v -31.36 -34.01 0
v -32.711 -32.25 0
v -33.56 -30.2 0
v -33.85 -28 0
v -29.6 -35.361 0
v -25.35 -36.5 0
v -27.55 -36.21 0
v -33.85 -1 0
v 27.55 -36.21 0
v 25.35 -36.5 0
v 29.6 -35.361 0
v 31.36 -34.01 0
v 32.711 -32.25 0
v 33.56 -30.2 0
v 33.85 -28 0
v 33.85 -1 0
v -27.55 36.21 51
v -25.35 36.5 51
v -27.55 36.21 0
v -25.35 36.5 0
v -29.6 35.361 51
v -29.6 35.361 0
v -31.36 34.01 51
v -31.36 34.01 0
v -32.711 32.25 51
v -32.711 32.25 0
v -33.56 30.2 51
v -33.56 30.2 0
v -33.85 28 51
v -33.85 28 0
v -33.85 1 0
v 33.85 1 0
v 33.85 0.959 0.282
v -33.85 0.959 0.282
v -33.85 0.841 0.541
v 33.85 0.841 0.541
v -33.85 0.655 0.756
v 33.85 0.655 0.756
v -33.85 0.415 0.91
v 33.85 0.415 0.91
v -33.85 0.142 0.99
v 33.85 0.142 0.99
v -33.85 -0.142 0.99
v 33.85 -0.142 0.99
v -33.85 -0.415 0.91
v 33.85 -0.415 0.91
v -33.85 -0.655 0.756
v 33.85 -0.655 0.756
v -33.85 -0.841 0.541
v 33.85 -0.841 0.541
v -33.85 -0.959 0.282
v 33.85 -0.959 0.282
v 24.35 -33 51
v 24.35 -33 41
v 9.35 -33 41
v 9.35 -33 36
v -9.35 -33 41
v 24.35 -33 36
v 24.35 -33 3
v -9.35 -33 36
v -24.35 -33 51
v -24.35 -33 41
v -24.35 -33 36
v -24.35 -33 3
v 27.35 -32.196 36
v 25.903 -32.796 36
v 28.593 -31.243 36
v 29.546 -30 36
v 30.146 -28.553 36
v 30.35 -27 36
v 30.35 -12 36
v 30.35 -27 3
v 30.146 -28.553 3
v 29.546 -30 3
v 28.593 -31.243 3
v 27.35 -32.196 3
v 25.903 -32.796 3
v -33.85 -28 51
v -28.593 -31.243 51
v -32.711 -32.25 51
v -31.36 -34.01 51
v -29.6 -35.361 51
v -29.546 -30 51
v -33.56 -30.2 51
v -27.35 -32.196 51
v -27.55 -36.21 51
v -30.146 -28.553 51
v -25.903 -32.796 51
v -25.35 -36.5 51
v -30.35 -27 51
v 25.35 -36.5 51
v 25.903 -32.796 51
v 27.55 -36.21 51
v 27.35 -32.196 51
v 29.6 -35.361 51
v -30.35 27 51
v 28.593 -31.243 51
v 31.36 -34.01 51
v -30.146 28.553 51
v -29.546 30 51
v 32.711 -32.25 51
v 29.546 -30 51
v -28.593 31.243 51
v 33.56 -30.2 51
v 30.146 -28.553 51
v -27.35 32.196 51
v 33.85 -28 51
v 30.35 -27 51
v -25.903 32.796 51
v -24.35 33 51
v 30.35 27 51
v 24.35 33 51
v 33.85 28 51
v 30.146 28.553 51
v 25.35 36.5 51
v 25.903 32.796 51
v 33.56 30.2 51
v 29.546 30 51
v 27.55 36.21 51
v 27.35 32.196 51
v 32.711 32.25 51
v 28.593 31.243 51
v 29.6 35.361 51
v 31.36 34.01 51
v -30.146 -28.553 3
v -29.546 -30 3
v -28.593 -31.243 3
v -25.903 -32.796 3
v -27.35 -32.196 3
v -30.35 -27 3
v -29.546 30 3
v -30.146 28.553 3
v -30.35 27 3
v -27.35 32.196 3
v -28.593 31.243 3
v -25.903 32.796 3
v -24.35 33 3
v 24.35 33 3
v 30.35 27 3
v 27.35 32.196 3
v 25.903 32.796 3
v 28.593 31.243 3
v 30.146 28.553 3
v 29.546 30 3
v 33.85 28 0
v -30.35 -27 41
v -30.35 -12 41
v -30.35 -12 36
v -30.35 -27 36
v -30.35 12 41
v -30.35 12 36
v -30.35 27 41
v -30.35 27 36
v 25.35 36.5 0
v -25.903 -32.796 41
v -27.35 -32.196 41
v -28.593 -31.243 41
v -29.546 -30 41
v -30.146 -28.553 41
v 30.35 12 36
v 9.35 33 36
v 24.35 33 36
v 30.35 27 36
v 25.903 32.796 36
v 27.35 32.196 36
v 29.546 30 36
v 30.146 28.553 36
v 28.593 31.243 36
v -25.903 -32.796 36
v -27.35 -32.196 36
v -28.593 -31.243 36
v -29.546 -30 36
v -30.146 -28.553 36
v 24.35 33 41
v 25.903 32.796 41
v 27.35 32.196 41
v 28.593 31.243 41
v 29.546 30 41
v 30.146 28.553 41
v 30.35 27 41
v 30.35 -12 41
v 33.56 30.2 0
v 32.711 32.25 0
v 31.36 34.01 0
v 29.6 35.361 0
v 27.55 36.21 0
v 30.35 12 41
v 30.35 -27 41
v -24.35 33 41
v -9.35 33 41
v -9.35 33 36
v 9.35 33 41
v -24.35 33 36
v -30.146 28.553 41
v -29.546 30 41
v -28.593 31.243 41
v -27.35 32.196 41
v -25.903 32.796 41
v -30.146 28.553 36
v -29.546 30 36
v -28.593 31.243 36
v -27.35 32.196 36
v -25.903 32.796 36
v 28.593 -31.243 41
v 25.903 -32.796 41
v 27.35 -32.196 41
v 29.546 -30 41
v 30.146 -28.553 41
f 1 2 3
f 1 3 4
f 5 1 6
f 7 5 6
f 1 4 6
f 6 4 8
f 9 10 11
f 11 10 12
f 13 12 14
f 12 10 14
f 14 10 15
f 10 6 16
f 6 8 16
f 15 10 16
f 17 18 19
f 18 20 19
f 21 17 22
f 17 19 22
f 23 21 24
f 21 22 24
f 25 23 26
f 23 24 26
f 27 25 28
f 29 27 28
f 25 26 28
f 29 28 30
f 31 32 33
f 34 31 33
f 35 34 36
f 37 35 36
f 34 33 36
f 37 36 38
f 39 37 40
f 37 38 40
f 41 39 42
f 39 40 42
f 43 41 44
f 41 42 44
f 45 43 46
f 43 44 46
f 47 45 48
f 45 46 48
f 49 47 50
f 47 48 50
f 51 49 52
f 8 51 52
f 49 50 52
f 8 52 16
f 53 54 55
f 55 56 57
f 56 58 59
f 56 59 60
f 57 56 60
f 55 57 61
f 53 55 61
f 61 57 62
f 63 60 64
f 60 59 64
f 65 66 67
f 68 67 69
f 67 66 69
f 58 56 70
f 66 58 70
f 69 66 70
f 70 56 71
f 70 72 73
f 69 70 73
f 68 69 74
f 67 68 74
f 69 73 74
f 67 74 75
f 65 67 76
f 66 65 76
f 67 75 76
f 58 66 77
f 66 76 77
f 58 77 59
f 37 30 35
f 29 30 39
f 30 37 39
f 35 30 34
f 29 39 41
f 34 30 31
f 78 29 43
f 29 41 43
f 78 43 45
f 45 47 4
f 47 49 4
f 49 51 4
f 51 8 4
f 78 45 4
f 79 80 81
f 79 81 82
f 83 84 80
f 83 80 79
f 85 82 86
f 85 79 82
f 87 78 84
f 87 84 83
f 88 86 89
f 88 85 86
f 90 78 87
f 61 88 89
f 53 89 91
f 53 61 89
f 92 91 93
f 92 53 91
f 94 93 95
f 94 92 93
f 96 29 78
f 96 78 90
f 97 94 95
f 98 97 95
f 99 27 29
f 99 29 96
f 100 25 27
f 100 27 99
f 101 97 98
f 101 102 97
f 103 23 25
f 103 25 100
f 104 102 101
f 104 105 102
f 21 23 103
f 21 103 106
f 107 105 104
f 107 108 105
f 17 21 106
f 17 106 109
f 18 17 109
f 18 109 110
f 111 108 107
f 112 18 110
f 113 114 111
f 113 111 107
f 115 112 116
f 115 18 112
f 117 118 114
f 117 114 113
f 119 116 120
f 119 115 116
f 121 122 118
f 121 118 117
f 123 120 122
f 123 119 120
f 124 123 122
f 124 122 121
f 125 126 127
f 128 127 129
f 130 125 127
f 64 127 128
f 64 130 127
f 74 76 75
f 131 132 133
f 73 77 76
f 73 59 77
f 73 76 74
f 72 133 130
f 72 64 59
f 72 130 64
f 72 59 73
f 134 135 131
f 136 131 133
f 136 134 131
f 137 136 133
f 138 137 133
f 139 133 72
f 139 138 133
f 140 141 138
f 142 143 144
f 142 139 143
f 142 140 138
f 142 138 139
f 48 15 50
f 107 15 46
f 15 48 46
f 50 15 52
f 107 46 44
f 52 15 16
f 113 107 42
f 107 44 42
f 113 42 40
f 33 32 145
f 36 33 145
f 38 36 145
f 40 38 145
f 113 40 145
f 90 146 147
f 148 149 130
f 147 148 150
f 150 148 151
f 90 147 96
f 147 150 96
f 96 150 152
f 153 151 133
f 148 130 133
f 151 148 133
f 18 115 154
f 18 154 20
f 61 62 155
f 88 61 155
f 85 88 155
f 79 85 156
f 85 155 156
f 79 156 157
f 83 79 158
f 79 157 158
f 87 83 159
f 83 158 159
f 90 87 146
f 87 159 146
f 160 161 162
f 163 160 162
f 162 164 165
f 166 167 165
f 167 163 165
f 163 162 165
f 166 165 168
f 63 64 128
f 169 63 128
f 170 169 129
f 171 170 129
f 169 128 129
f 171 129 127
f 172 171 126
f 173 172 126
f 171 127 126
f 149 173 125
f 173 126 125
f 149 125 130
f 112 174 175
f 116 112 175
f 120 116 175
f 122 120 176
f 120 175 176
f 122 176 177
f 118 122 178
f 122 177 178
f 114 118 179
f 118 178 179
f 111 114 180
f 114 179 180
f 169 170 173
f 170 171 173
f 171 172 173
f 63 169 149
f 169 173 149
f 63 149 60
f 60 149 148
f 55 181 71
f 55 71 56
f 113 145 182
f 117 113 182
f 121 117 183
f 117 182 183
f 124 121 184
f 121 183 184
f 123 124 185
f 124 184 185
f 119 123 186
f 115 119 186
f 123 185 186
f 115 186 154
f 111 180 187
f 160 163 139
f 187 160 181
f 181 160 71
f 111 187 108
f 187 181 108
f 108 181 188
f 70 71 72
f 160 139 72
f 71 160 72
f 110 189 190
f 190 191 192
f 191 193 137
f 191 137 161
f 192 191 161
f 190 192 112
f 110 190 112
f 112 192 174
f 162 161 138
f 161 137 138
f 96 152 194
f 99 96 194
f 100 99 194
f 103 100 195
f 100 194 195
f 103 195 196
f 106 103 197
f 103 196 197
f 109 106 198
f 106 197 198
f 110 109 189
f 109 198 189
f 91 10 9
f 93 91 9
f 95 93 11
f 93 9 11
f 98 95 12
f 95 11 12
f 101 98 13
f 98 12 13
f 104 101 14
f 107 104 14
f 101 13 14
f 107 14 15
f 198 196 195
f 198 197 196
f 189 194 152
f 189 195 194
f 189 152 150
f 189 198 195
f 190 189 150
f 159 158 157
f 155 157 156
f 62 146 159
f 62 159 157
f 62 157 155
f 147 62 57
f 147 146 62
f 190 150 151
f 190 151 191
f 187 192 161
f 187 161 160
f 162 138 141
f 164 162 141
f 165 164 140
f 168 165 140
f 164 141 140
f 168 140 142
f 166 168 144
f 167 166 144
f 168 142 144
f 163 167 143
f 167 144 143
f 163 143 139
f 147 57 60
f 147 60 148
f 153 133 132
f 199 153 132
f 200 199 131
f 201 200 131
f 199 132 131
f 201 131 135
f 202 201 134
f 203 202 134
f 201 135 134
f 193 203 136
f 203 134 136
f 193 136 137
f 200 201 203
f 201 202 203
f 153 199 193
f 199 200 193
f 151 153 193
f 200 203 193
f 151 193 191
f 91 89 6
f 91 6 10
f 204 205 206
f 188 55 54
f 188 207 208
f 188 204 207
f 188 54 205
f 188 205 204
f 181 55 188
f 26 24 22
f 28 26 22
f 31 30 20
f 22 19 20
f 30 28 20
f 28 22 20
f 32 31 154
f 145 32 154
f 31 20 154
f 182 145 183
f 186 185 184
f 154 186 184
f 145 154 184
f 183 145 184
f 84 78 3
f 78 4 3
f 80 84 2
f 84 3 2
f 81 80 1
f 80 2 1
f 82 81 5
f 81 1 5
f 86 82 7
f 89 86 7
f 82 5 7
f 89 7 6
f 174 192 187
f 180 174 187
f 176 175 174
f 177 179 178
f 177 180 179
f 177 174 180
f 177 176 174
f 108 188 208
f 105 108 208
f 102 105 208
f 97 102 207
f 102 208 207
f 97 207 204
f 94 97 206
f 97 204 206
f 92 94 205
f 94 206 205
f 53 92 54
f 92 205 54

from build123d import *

# Parameters (mm, degrees)
F1_DEPTH = 3
F3_DEPTH = 38
F5_DEPTH = 5
F7_DEPTH = 10
F9_DEPTH = 67.701


# Not quite as in the source:
# - a feature names something its author has since deleted; it is built from what else it names


with BuildPart() as f1:
    # F0 (on Top) → F1 (new body)
    with BuildSketch(Plane.XY):
        with BuildLine():
            Line((-25.35, -36.5), (25.35, -36.5))
            ThreePointArc((25.35, -36.5), (31.3604076401, -34.0104076401), (33.85, -28))
            Line((33.85, -28), (33.85, 28))
            ThreePointArc((33.85, 28), (31.3604076401, 34.0104076401), (25.35, 36.5))
            Line((25.35, 36.5), (-25.35, 36.5))
            ThreePointArc((-25.35, 36.5), (-31.3604076401, 34.0104076401), (-33.85, 28))
            Line((-33.85, 28), (-33.85, -28))
            ThreePointArc((-33.85, -28), (-31.3604076401, -34.0104076401), (-25.35, -36.5))
        make_face()
    extrude(amount=F1_DEPTH)

    # F2 (on face) → F3 (join)
    with BuildSketch(Plane.XY.offset(3)):
        with BuildLine():
            ThreePointArc((-25.35, 36.5), (-31.3604076401, 34.0104076401), (-33.85, 28))
            Line((-33.85, 28), (-33.85, -28))
            ThreePointArc((-33.85, -28), (-31.3604076401, -34.0104076401), (-25.35, -36.5))
            Line((-25.35, -36.5), (25.35, -36.5))
            ThreePointArc((25.35, -36.5), (31.3604076401, -34.0104076401), (33.85, -28))
            Line((33.85, -28), (33.85, 28))
            ThreePointArc((33.85, 28), (31.3604076401, 34.0104076401), (25.35, 36.5))
            Line((25.35, 36.5), (-25.35, 36.5))
        make_face()
        with BuildLine():
            ThreePointArc((30.35, -27), (28.5926406871, -31.2426406871), (24.35, -33))
            Line((24.35, -33), (-24.35, -33))
            ThreePointArc((-24.35, -33), (-28.5926406871, -31.2426406871), (-30.35, -27))
            Line((-30.35, -27), (-30.35, 27))
            ThreePointArc((-30.35, 27), (-28.5926406871, 31.2426406871), (-24.35, 33))
            Line((-24.35, 33), (24.35, 33))
            ThreePointArc((24.35, 33), (28.5926406871, 31.2426406871), (30.35, 27))
            Line((30.35, 27), (30.35, -27))
        make_face(mode=Mode.SUBTRACT)
    extrude(amount=F3_DEPTH)

    # F4 (on face) → F5 (join)
    with BuildSketch(Plane.XY.offset(41)):
        with BuildLine():
            Line((25.35, 36.5), (-25.35, 36.5))
            ThreePointArc((-25.35, 36.5), (-31.3604076401, 34.0104076401), (-33.85, 28))
            Line((-33.85, 28), (-33.85, -28))
            ThreePointArc((-33.85, -28), (-31.3604076401, -34.0104076401), (-25.35, -36.5))
            Line((-25.35, -36.5), (25.35, -36.5))
            ThreePointArc((25.35, -36.5), (31.3604076401, -34.0104076401), (33.85, -28))
            Line((33.85, -28), (33.85, 28))
            ThreePointArc((33.85, 28), (31.3604076401, 34.0104076401), (25.35, 36.5))
        make_face()
        Polygon((24.35, 33), (30.35, 33), (30.35, 27), (30.35, 12), (30.35, -12), (30.35, -27), (30.35, -33), (24.35, -33), (9.35, -33), (-9.35, -33), (-24.35, -33), (-30.35, -33), (-30.35, -27), (-30.35, -12), (-30.35, 12), (-30.35, 27), (-30.35, 33), (-24.35, 33), (-9.35, 33), (9.35, 33), align=None, mode=Mode.SUBTRACT)
        with BuildLine():
            ThreePointArc((-30.35, 27), (-28.5926406871, 31.2426406871), (-24.35, 33))
            Line((-24.35, 33), (-30.35, 33))
            Line((-30.35, 33), (-30.35, 27))
        make_face()
        with BuildLine():
            Line((30.35, 27), (30.35, 33))
            Line((30.35, 33), (24.35, 33))
            ThreePointArc((24.35, 33), (28.5926406871, 31.2426406871), (30.35, 27))
        make_face()
        with BuildLine():
            Line((30.35, -33), (30.35, -27))
            ThreePointArc((30.35, -27), (28.5926406871, -31.2426406871), (24.35, -33))
            Line((24.35, -33), (30.35, -33))
        make_face()
        with BuildLine():
            ThreePointArc((-24.35, -33), (-28.5926406871, -31.2426406871), (-30.35, -27))
            Line((-30.35, -27), (-30.35, -33))
            Line((-30.35, -33), (-24.35, -33))
        make_face()
        with BuildLine():
            Line((30.35, -27), (30.35, -12))
            Line((30.35, -12), (9.35, -33))
            Line((9.35, -33), (24.35, -33))
            ThreePointArc((24.35, -33), (28.5926406871, -31.2426406871), (30.35, -27))
        make_face()
        with BuildLine():
            ThreePointArc((30.35, 27), (28.5926406871, 31.2426406871), (24.35, 33))
            Line((24.35, 33), (9.35, 33))
            Line((9.35, 33), (30.35, 12))
            Line((30.35, 12), (30.35, 27))
        make_face()
        with BuildLine():
            Line((-30.35, 12), (-9.35, 33))
            Line((-9.35, 33), (-24.35, 33))
            ThreePointArc((-24.35, 33), (-28.5926406871, 31.2426406871), (-30.35, 27))
            Line((-30.35, 27), (-30.35, 12))
        make_face()
        with BuildLine():
            Line((-9.35, -33), (-30.35, -12))
            Line((-30.35, -12), (-30.35, -27))
            ThreePointArc((-30.35, -27), (-28.5926406871, -31.2426406871), (-24.35, -33))
            Line((-24.35, -33), (-9.35, -33))
        make_face()
    extrude(amount=-F5_DEPTH)

    # F6 (on face) → F7 (join)
    with BuildSketch(Plane.XY.offset(41)):
        with BuildLine():
            Line((25.35, 36.5), (-25.35, 36.5))
            ThreePointArc((-25.35, 36.5), (-31.3604076401, 34.0104076401), (-33.85, 28))
            Line((-33.85, 28), (-33.85, -28))
            ThreePointArc((-33.85, -28), (-31.3604076401, -34.0104076401), (-25.35, -36.5))
            Line((-25.35, -36.5), (25.35, -36.5))
            ThreePointArc((25.35, -36.5), (31.3604076401, -34.0104076401), (33.85, -28))
            Line((33.85, -28), (33.85, 28))
            ThreePointArc((33.85, 28), (31.3604076401, 34.0104076401), (25.35, 36.5))
        make_face()
        with BuildLine():
            Line((9.35, 33), (24.35, 33))
            ThreePointArc((24.35, 33), (28.5926406871, 31.2426406871), (30.35, 27))
            Line((30.35, 27), (30.35, 12))
            Line((30.35, 12), (30.35, -12))
            Line((30.35, -12), (30.35, -27))
            ThreePointArc((30.35, -27), (28.5926406871, -31.2426406871), (24.35, -33))
            Line((24.35, -33), (9.35, -33))
            Line((9.35, -33), (-9.35, -33))
            Line((-9.35, -33), (-24.35, -33))
            ThreePointArc((-24.35, -33), (-28.5926406871, -31.2426406871), (-30.35, -27))
            Line((-30.35, -27), (-30.35, -12))
            Line((-30.35, -12), (-30.35, 12))
            Line((-30.35, 12), (-30.35, 27))
            ThreePointArc((-30.35, 27), (-28.5926406871, 31.2426406871), (-24.35, 33))
            Line((-24.35, 33), (-9.35, 33))
            Line((-9.35, 33), (9.35, 33))
        make_face(mode=Mode.SUBTRACT)
    extrude(amount=F7_DEPTH)

    # F8 (on face) → F9 (cut, through all)
    with BuildSketch(Plane.YZ.offset(33.85)):
        with BuildLine():
            Line((-1, 0), (1, 0))
            ThreePointArc((1, 0), (0, 1), (-1, 0))
        make_face()
    extrude(amount=-F9_DEPTH, mode=Mode.SUBTRACT)


solid = f1.part
